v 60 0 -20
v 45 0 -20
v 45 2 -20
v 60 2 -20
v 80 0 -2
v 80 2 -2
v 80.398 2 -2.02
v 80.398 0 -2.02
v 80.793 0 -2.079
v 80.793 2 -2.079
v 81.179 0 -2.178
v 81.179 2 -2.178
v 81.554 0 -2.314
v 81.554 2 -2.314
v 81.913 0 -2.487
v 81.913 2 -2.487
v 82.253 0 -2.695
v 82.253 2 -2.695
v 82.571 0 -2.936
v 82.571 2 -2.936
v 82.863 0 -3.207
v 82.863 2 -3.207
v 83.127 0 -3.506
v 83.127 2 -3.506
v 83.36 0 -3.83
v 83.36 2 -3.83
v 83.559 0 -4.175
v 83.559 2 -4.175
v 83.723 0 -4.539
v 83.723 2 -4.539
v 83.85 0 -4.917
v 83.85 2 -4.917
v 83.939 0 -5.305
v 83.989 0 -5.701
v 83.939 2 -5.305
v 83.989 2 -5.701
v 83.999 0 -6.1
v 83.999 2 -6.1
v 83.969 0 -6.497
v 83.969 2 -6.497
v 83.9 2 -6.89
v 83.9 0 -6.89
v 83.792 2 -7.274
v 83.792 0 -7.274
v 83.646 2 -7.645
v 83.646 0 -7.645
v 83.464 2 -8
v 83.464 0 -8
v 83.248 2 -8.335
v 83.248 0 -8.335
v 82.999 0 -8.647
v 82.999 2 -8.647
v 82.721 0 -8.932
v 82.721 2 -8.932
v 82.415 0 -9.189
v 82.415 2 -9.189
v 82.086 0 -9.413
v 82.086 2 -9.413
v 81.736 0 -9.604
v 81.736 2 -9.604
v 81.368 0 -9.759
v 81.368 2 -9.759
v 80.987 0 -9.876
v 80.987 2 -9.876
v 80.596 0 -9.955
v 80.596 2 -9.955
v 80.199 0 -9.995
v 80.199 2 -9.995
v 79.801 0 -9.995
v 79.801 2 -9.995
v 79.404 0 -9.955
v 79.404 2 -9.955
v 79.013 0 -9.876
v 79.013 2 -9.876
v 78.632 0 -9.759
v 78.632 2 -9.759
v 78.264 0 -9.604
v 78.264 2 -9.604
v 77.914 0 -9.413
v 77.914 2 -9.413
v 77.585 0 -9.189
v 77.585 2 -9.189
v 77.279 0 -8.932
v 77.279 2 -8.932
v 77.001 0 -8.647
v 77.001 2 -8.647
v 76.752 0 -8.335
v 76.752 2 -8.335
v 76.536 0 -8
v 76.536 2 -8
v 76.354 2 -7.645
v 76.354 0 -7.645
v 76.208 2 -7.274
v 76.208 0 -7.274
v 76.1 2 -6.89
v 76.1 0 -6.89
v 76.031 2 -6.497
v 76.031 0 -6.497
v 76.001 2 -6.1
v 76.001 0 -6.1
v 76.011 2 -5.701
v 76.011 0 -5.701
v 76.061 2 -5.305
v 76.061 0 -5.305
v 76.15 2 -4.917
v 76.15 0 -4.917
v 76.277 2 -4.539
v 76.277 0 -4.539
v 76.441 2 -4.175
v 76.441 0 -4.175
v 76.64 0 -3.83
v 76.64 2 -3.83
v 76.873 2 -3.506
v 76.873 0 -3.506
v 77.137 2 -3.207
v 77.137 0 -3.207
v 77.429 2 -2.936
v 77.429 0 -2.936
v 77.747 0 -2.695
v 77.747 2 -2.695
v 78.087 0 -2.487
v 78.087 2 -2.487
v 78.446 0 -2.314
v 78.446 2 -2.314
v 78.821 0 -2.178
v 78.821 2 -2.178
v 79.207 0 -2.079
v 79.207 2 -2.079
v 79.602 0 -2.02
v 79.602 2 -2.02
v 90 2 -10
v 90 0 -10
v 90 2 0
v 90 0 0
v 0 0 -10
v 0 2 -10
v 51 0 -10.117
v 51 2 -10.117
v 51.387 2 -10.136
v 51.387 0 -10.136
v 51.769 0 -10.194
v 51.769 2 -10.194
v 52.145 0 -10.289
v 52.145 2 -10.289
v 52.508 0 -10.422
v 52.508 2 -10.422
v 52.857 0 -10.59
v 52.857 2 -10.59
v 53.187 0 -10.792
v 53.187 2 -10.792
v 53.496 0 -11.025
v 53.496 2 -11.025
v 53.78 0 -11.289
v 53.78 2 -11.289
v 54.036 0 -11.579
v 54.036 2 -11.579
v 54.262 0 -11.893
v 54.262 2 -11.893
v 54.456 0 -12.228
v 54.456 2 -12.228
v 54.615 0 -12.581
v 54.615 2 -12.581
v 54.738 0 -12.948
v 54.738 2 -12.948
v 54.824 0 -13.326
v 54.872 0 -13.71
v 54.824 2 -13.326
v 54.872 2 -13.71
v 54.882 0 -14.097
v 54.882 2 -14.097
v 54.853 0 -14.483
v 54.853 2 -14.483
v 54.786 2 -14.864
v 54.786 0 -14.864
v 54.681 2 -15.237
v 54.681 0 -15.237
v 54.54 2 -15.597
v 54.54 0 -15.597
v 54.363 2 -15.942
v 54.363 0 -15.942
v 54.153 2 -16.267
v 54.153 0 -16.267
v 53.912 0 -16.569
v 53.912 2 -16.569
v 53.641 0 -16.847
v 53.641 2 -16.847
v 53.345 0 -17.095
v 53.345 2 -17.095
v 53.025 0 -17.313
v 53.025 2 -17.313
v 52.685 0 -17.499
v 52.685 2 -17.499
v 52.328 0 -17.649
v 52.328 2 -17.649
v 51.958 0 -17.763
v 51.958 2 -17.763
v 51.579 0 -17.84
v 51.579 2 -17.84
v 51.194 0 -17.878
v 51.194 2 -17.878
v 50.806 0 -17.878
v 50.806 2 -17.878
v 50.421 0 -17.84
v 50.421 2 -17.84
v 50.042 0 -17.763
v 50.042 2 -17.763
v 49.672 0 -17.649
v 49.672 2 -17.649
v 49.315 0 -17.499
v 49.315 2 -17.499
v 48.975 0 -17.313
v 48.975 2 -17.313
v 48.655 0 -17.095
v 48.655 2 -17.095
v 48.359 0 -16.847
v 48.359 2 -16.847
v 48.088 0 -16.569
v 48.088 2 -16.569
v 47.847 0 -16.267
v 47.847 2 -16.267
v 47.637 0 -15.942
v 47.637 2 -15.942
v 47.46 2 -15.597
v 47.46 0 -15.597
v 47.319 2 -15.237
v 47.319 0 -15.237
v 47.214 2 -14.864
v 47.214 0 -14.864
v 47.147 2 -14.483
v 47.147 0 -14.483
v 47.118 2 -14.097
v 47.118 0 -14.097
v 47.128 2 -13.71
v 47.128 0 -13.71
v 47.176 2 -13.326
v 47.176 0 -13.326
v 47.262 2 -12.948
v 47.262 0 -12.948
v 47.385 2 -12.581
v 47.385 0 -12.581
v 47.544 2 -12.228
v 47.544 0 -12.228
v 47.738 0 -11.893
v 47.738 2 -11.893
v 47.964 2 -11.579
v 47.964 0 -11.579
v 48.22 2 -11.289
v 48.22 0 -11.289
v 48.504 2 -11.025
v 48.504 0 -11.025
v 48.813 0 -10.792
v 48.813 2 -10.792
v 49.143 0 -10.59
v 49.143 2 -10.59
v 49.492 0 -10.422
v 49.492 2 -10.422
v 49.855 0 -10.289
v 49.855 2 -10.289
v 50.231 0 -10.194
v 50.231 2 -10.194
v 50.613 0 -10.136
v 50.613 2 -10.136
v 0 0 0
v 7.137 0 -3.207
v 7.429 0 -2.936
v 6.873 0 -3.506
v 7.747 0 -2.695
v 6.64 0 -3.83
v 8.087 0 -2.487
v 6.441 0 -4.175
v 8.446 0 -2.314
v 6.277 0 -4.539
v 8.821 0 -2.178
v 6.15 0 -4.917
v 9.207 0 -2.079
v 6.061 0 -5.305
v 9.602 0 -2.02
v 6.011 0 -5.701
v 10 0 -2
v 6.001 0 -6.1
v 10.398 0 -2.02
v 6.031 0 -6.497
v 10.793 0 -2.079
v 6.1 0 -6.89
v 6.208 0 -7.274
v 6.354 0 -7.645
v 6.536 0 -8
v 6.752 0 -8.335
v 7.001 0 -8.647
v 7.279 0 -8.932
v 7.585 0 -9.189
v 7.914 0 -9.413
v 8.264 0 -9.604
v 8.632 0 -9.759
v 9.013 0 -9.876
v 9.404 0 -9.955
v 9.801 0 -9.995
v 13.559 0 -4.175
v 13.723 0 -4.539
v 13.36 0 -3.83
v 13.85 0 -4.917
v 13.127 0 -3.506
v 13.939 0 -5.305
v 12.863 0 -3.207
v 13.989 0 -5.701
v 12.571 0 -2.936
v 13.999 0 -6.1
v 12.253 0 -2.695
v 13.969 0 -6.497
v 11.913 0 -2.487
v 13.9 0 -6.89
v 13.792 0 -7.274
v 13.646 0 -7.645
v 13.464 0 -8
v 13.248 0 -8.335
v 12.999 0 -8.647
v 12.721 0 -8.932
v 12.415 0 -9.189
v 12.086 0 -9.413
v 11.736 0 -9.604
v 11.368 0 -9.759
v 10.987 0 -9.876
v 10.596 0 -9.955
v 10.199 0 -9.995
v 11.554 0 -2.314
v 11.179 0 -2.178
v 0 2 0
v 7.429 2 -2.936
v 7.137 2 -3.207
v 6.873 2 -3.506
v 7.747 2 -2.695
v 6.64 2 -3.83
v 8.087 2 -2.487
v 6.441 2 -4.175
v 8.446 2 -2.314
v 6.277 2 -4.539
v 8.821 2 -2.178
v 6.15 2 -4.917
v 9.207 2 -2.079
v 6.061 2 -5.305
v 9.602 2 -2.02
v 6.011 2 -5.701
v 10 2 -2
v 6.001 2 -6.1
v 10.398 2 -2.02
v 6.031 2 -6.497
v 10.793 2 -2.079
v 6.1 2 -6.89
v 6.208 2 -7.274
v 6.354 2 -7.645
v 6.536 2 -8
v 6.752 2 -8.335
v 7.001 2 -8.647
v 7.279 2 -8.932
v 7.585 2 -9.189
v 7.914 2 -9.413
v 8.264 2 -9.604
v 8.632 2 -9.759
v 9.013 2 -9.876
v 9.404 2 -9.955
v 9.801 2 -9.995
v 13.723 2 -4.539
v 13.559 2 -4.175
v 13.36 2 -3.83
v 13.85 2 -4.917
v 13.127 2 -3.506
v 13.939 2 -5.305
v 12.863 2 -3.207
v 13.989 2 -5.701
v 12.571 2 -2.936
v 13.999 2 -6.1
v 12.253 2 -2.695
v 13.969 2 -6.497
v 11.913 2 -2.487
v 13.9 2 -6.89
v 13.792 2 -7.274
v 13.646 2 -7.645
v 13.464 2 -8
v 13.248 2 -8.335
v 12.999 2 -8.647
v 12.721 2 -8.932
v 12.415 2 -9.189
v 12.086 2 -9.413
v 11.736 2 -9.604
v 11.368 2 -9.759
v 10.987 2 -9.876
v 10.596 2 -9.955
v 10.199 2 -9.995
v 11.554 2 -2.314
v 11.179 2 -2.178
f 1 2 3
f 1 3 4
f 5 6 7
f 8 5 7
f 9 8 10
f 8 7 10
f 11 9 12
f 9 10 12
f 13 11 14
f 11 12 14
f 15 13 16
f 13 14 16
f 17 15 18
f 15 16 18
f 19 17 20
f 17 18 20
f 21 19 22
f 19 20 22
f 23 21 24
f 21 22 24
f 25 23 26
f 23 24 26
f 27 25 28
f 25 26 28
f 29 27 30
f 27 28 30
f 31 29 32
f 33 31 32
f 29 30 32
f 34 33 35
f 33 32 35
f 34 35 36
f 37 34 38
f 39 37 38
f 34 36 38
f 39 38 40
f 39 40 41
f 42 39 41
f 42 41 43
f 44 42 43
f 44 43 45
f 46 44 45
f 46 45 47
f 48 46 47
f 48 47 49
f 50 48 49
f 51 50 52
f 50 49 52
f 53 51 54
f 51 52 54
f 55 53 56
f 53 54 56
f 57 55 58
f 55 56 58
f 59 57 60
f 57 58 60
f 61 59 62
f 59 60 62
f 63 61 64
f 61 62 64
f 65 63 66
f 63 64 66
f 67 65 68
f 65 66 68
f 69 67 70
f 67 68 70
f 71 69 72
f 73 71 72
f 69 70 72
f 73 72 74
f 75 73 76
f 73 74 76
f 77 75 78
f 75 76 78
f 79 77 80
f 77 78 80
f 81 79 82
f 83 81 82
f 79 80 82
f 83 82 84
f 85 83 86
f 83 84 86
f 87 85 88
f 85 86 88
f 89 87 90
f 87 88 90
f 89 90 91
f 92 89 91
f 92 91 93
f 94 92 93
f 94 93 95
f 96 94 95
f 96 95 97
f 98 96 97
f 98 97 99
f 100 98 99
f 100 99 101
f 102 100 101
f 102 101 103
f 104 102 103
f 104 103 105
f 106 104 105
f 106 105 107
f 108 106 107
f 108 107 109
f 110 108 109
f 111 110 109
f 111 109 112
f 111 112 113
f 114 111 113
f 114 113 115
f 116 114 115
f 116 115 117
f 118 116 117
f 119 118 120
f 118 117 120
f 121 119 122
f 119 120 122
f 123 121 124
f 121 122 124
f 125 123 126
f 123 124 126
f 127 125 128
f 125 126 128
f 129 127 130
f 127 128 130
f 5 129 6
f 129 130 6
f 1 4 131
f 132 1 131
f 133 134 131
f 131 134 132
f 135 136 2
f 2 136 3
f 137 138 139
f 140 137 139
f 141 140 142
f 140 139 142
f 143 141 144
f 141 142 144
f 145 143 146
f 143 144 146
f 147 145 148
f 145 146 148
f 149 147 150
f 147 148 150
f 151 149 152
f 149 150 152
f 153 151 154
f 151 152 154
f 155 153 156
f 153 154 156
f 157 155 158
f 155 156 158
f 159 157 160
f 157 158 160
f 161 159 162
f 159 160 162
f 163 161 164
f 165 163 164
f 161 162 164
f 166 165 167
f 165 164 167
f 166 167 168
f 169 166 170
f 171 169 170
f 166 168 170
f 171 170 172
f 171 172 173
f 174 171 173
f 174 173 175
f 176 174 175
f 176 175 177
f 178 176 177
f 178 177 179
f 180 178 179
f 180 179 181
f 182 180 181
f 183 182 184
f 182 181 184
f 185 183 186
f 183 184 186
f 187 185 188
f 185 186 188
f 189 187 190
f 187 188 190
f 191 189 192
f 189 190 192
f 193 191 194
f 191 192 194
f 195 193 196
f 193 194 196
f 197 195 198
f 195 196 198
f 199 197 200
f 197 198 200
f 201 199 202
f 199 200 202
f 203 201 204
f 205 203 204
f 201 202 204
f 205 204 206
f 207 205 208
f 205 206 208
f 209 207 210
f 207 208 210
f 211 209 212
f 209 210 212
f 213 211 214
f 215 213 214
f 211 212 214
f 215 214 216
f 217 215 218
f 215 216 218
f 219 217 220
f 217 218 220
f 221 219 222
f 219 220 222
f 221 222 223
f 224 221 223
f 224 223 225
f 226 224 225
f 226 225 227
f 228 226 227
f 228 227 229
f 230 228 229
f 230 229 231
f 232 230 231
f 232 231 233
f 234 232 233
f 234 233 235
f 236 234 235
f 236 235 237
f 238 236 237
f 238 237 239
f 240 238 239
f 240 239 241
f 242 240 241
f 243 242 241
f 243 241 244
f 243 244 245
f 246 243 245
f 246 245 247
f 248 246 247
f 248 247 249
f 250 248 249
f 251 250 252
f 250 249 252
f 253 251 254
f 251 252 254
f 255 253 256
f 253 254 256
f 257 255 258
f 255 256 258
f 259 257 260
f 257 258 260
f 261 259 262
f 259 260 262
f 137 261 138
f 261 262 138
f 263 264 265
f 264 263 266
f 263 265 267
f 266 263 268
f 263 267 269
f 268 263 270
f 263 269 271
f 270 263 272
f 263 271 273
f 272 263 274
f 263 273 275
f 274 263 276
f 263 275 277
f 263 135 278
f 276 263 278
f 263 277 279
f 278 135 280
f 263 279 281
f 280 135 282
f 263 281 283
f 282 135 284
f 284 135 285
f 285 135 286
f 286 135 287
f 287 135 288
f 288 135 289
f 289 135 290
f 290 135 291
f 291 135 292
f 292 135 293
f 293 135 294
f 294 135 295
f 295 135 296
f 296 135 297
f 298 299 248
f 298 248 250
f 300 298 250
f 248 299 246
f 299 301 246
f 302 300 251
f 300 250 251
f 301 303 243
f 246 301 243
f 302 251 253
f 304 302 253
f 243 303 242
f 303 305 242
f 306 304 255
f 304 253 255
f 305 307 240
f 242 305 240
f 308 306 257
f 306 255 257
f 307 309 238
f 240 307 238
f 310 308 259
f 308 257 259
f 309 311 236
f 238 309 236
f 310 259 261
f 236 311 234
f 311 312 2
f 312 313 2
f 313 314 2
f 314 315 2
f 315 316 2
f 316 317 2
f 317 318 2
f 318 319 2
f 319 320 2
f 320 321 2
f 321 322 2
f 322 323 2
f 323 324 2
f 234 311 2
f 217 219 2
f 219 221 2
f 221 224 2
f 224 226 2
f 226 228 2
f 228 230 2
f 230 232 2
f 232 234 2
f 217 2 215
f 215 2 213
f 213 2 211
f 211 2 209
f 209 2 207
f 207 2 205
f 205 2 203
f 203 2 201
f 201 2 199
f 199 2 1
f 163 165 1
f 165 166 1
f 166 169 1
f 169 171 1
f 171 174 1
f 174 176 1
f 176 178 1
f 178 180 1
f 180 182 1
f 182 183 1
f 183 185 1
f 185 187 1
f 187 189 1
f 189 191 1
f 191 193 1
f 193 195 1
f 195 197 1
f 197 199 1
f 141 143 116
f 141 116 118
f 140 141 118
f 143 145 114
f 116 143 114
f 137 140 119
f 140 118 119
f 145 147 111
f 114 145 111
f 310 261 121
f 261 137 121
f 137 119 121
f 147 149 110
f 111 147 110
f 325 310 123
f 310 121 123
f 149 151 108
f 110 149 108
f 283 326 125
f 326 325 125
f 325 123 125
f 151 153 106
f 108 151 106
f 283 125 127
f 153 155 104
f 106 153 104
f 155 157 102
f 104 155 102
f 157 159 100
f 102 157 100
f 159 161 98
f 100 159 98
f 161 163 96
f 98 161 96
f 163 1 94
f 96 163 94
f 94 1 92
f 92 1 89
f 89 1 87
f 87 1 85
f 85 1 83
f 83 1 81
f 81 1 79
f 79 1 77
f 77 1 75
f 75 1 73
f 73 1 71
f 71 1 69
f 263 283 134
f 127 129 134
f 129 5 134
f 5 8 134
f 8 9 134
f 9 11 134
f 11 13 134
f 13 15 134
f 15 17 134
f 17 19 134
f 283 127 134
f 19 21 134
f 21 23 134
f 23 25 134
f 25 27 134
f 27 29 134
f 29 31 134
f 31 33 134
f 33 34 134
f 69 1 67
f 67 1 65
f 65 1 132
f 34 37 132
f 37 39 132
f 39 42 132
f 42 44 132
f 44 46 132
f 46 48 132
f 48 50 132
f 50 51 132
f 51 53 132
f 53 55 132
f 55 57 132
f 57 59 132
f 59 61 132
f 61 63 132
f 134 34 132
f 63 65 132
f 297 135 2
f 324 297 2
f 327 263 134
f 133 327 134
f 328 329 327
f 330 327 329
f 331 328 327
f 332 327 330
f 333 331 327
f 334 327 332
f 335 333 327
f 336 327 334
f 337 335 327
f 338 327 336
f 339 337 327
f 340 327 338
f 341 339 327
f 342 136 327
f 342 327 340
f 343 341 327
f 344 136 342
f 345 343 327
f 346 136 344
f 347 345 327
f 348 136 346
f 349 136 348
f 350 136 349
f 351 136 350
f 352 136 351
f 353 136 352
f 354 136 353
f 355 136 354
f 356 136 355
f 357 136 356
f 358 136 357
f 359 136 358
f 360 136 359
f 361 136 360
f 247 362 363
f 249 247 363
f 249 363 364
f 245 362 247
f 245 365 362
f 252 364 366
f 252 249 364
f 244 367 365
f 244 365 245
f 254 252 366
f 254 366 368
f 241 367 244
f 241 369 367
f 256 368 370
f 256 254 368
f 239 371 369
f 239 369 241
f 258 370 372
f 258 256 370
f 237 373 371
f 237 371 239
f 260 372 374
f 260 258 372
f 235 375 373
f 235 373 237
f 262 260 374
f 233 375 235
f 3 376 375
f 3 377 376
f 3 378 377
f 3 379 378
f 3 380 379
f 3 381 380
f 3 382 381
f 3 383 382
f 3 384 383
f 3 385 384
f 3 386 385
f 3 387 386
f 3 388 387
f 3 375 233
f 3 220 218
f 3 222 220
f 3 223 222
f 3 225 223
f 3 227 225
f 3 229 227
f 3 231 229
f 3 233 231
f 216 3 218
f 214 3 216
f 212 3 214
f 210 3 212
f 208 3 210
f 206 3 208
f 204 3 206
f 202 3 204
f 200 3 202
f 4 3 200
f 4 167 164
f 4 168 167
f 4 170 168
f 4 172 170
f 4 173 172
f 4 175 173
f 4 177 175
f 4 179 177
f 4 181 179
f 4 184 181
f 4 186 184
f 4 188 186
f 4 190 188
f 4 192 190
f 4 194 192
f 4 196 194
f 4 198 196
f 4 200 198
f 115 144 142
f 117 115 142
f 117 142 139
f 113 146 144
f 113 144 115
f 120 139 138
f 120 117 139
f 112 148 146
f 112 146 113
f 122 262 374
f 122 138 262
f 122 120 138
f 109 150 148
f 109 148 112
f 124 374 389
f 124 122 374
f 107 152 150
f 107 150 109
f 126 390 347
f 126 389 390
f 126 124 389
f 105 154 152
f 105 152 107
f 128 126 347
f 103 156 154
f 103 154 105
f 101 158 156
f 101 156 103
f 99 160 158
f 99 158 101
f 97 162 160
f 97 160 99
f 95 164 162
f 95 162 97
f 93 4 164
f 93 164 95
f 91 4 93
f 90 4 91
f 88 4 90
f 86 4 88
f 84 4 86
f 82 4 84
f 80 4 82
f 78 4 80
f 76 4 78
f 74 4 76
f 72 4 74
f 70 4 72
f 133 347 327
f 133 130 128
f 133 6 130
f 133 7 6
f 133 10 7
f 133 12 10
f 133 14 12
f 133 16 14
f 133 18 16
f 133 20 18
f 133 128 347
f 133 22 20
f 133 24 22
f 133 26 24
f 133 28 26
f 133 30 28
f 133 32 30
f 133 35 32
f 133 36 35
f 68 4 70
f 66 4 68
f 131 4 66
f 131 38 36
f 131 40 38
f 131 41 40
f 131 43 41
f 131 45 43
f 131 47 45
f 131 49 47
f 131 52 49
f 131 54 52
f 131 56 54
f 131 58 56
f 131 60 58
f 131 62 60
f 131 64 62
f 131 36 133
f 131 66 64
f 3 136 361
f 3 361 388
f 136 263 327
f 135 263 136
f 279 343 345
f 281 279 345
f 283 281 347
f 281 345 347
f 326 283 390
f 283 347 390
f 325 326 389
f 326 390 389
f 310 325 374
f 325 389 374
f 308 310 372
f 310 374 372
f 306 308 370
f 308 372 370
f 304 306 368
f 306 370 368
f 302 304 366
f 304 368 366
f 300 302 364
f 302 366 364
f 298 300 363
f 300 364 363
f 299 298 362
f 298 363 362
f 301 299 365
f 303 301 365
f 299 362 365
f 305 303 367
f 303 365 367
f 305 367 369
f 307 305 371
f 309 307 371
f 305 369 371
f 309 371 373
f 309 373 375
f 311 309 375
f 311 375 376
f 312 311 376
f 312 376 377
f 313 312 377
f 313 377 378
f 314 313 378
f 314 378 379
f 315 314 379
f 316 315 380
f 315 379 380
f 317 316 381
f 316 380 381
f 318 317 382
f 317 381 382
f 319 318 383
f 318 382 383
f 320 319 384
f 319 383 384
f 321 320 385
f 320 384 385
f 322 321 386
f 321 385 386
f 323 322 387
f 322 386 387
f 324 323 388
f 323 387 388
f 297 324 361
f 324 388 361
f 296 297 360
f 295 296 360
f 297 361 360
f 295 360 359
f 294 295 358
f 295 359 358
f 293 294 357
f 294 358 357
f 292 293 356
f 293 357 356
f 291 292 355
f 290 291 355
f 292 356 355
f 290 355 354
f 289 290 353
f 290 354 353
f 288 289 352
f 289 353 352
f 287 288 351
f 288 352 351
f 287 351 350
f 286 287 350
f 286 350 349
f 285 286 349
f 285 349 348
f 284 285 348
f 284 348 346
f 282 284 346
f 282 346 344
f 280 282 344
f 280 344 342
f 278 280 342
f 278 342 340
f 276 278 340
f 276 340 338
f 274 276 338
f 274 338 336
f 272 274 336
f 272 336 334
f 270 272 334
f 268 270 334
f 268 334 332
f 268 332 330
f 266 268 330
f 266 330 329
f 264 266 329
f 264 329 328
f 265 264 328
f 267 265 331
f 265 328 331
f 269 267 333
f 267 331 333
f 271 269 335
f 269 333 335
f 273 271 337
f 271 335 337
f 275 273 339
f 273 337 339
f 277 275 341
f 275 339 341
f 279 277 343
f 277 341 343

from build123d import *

# Parameters (mm, degrees)
SKETCH1_W           = 90
SKETCH1_H           = 20
BOSS_EXTRUDE1_DEPTH = 2
SKETCH2_R           = 4
SKETCH2_R_2         = 3.883174387
CUT_EXTRUDE1_DEPTH  = 2


with BuildPart() as part:
    # Sketch1 → Boss-Extrude1 (new body)
    with BuildSketch(Plane(origin=(0, 0, 0), x_dir=(1, 0, 0), z_dir=(0, 1, 0))):
        with Locations((45, 10)):
            Rectangle(SKETCH1_W, SKETCH1_H)
    extrude(amount=BOSS_EXTRUDE1_DEPTH)

    # Sketch2 → Cut-Extrude1 (cut)
    with BuildSketch(Plane(origin=(0, 2, 0), x_dir=(1, 0, 0), z_dir=(0, 1, 0))):
        with Locations(Location((10, 6, 0), (0, 0, 270))):
            Circle(SKETCH2_R)
        with Locations(Location((51, 14, 0), (0, 0, 270))):
            Circle(SKETCH2_R_2)
        with Locations(Location((80, 6, 0), (0, 0, 270))):
            Circle(SKETCH2_R)
        Polygon((0, 20), (0, 10), (45, 20), align=None)
        Polygon((90, 20), (60, 20), (90, 10), align=None)
    extrude(amount=-CUT_EXTRUDE1_DEPTH, mode=Mode.SUBTRACT)


solid = part.part
